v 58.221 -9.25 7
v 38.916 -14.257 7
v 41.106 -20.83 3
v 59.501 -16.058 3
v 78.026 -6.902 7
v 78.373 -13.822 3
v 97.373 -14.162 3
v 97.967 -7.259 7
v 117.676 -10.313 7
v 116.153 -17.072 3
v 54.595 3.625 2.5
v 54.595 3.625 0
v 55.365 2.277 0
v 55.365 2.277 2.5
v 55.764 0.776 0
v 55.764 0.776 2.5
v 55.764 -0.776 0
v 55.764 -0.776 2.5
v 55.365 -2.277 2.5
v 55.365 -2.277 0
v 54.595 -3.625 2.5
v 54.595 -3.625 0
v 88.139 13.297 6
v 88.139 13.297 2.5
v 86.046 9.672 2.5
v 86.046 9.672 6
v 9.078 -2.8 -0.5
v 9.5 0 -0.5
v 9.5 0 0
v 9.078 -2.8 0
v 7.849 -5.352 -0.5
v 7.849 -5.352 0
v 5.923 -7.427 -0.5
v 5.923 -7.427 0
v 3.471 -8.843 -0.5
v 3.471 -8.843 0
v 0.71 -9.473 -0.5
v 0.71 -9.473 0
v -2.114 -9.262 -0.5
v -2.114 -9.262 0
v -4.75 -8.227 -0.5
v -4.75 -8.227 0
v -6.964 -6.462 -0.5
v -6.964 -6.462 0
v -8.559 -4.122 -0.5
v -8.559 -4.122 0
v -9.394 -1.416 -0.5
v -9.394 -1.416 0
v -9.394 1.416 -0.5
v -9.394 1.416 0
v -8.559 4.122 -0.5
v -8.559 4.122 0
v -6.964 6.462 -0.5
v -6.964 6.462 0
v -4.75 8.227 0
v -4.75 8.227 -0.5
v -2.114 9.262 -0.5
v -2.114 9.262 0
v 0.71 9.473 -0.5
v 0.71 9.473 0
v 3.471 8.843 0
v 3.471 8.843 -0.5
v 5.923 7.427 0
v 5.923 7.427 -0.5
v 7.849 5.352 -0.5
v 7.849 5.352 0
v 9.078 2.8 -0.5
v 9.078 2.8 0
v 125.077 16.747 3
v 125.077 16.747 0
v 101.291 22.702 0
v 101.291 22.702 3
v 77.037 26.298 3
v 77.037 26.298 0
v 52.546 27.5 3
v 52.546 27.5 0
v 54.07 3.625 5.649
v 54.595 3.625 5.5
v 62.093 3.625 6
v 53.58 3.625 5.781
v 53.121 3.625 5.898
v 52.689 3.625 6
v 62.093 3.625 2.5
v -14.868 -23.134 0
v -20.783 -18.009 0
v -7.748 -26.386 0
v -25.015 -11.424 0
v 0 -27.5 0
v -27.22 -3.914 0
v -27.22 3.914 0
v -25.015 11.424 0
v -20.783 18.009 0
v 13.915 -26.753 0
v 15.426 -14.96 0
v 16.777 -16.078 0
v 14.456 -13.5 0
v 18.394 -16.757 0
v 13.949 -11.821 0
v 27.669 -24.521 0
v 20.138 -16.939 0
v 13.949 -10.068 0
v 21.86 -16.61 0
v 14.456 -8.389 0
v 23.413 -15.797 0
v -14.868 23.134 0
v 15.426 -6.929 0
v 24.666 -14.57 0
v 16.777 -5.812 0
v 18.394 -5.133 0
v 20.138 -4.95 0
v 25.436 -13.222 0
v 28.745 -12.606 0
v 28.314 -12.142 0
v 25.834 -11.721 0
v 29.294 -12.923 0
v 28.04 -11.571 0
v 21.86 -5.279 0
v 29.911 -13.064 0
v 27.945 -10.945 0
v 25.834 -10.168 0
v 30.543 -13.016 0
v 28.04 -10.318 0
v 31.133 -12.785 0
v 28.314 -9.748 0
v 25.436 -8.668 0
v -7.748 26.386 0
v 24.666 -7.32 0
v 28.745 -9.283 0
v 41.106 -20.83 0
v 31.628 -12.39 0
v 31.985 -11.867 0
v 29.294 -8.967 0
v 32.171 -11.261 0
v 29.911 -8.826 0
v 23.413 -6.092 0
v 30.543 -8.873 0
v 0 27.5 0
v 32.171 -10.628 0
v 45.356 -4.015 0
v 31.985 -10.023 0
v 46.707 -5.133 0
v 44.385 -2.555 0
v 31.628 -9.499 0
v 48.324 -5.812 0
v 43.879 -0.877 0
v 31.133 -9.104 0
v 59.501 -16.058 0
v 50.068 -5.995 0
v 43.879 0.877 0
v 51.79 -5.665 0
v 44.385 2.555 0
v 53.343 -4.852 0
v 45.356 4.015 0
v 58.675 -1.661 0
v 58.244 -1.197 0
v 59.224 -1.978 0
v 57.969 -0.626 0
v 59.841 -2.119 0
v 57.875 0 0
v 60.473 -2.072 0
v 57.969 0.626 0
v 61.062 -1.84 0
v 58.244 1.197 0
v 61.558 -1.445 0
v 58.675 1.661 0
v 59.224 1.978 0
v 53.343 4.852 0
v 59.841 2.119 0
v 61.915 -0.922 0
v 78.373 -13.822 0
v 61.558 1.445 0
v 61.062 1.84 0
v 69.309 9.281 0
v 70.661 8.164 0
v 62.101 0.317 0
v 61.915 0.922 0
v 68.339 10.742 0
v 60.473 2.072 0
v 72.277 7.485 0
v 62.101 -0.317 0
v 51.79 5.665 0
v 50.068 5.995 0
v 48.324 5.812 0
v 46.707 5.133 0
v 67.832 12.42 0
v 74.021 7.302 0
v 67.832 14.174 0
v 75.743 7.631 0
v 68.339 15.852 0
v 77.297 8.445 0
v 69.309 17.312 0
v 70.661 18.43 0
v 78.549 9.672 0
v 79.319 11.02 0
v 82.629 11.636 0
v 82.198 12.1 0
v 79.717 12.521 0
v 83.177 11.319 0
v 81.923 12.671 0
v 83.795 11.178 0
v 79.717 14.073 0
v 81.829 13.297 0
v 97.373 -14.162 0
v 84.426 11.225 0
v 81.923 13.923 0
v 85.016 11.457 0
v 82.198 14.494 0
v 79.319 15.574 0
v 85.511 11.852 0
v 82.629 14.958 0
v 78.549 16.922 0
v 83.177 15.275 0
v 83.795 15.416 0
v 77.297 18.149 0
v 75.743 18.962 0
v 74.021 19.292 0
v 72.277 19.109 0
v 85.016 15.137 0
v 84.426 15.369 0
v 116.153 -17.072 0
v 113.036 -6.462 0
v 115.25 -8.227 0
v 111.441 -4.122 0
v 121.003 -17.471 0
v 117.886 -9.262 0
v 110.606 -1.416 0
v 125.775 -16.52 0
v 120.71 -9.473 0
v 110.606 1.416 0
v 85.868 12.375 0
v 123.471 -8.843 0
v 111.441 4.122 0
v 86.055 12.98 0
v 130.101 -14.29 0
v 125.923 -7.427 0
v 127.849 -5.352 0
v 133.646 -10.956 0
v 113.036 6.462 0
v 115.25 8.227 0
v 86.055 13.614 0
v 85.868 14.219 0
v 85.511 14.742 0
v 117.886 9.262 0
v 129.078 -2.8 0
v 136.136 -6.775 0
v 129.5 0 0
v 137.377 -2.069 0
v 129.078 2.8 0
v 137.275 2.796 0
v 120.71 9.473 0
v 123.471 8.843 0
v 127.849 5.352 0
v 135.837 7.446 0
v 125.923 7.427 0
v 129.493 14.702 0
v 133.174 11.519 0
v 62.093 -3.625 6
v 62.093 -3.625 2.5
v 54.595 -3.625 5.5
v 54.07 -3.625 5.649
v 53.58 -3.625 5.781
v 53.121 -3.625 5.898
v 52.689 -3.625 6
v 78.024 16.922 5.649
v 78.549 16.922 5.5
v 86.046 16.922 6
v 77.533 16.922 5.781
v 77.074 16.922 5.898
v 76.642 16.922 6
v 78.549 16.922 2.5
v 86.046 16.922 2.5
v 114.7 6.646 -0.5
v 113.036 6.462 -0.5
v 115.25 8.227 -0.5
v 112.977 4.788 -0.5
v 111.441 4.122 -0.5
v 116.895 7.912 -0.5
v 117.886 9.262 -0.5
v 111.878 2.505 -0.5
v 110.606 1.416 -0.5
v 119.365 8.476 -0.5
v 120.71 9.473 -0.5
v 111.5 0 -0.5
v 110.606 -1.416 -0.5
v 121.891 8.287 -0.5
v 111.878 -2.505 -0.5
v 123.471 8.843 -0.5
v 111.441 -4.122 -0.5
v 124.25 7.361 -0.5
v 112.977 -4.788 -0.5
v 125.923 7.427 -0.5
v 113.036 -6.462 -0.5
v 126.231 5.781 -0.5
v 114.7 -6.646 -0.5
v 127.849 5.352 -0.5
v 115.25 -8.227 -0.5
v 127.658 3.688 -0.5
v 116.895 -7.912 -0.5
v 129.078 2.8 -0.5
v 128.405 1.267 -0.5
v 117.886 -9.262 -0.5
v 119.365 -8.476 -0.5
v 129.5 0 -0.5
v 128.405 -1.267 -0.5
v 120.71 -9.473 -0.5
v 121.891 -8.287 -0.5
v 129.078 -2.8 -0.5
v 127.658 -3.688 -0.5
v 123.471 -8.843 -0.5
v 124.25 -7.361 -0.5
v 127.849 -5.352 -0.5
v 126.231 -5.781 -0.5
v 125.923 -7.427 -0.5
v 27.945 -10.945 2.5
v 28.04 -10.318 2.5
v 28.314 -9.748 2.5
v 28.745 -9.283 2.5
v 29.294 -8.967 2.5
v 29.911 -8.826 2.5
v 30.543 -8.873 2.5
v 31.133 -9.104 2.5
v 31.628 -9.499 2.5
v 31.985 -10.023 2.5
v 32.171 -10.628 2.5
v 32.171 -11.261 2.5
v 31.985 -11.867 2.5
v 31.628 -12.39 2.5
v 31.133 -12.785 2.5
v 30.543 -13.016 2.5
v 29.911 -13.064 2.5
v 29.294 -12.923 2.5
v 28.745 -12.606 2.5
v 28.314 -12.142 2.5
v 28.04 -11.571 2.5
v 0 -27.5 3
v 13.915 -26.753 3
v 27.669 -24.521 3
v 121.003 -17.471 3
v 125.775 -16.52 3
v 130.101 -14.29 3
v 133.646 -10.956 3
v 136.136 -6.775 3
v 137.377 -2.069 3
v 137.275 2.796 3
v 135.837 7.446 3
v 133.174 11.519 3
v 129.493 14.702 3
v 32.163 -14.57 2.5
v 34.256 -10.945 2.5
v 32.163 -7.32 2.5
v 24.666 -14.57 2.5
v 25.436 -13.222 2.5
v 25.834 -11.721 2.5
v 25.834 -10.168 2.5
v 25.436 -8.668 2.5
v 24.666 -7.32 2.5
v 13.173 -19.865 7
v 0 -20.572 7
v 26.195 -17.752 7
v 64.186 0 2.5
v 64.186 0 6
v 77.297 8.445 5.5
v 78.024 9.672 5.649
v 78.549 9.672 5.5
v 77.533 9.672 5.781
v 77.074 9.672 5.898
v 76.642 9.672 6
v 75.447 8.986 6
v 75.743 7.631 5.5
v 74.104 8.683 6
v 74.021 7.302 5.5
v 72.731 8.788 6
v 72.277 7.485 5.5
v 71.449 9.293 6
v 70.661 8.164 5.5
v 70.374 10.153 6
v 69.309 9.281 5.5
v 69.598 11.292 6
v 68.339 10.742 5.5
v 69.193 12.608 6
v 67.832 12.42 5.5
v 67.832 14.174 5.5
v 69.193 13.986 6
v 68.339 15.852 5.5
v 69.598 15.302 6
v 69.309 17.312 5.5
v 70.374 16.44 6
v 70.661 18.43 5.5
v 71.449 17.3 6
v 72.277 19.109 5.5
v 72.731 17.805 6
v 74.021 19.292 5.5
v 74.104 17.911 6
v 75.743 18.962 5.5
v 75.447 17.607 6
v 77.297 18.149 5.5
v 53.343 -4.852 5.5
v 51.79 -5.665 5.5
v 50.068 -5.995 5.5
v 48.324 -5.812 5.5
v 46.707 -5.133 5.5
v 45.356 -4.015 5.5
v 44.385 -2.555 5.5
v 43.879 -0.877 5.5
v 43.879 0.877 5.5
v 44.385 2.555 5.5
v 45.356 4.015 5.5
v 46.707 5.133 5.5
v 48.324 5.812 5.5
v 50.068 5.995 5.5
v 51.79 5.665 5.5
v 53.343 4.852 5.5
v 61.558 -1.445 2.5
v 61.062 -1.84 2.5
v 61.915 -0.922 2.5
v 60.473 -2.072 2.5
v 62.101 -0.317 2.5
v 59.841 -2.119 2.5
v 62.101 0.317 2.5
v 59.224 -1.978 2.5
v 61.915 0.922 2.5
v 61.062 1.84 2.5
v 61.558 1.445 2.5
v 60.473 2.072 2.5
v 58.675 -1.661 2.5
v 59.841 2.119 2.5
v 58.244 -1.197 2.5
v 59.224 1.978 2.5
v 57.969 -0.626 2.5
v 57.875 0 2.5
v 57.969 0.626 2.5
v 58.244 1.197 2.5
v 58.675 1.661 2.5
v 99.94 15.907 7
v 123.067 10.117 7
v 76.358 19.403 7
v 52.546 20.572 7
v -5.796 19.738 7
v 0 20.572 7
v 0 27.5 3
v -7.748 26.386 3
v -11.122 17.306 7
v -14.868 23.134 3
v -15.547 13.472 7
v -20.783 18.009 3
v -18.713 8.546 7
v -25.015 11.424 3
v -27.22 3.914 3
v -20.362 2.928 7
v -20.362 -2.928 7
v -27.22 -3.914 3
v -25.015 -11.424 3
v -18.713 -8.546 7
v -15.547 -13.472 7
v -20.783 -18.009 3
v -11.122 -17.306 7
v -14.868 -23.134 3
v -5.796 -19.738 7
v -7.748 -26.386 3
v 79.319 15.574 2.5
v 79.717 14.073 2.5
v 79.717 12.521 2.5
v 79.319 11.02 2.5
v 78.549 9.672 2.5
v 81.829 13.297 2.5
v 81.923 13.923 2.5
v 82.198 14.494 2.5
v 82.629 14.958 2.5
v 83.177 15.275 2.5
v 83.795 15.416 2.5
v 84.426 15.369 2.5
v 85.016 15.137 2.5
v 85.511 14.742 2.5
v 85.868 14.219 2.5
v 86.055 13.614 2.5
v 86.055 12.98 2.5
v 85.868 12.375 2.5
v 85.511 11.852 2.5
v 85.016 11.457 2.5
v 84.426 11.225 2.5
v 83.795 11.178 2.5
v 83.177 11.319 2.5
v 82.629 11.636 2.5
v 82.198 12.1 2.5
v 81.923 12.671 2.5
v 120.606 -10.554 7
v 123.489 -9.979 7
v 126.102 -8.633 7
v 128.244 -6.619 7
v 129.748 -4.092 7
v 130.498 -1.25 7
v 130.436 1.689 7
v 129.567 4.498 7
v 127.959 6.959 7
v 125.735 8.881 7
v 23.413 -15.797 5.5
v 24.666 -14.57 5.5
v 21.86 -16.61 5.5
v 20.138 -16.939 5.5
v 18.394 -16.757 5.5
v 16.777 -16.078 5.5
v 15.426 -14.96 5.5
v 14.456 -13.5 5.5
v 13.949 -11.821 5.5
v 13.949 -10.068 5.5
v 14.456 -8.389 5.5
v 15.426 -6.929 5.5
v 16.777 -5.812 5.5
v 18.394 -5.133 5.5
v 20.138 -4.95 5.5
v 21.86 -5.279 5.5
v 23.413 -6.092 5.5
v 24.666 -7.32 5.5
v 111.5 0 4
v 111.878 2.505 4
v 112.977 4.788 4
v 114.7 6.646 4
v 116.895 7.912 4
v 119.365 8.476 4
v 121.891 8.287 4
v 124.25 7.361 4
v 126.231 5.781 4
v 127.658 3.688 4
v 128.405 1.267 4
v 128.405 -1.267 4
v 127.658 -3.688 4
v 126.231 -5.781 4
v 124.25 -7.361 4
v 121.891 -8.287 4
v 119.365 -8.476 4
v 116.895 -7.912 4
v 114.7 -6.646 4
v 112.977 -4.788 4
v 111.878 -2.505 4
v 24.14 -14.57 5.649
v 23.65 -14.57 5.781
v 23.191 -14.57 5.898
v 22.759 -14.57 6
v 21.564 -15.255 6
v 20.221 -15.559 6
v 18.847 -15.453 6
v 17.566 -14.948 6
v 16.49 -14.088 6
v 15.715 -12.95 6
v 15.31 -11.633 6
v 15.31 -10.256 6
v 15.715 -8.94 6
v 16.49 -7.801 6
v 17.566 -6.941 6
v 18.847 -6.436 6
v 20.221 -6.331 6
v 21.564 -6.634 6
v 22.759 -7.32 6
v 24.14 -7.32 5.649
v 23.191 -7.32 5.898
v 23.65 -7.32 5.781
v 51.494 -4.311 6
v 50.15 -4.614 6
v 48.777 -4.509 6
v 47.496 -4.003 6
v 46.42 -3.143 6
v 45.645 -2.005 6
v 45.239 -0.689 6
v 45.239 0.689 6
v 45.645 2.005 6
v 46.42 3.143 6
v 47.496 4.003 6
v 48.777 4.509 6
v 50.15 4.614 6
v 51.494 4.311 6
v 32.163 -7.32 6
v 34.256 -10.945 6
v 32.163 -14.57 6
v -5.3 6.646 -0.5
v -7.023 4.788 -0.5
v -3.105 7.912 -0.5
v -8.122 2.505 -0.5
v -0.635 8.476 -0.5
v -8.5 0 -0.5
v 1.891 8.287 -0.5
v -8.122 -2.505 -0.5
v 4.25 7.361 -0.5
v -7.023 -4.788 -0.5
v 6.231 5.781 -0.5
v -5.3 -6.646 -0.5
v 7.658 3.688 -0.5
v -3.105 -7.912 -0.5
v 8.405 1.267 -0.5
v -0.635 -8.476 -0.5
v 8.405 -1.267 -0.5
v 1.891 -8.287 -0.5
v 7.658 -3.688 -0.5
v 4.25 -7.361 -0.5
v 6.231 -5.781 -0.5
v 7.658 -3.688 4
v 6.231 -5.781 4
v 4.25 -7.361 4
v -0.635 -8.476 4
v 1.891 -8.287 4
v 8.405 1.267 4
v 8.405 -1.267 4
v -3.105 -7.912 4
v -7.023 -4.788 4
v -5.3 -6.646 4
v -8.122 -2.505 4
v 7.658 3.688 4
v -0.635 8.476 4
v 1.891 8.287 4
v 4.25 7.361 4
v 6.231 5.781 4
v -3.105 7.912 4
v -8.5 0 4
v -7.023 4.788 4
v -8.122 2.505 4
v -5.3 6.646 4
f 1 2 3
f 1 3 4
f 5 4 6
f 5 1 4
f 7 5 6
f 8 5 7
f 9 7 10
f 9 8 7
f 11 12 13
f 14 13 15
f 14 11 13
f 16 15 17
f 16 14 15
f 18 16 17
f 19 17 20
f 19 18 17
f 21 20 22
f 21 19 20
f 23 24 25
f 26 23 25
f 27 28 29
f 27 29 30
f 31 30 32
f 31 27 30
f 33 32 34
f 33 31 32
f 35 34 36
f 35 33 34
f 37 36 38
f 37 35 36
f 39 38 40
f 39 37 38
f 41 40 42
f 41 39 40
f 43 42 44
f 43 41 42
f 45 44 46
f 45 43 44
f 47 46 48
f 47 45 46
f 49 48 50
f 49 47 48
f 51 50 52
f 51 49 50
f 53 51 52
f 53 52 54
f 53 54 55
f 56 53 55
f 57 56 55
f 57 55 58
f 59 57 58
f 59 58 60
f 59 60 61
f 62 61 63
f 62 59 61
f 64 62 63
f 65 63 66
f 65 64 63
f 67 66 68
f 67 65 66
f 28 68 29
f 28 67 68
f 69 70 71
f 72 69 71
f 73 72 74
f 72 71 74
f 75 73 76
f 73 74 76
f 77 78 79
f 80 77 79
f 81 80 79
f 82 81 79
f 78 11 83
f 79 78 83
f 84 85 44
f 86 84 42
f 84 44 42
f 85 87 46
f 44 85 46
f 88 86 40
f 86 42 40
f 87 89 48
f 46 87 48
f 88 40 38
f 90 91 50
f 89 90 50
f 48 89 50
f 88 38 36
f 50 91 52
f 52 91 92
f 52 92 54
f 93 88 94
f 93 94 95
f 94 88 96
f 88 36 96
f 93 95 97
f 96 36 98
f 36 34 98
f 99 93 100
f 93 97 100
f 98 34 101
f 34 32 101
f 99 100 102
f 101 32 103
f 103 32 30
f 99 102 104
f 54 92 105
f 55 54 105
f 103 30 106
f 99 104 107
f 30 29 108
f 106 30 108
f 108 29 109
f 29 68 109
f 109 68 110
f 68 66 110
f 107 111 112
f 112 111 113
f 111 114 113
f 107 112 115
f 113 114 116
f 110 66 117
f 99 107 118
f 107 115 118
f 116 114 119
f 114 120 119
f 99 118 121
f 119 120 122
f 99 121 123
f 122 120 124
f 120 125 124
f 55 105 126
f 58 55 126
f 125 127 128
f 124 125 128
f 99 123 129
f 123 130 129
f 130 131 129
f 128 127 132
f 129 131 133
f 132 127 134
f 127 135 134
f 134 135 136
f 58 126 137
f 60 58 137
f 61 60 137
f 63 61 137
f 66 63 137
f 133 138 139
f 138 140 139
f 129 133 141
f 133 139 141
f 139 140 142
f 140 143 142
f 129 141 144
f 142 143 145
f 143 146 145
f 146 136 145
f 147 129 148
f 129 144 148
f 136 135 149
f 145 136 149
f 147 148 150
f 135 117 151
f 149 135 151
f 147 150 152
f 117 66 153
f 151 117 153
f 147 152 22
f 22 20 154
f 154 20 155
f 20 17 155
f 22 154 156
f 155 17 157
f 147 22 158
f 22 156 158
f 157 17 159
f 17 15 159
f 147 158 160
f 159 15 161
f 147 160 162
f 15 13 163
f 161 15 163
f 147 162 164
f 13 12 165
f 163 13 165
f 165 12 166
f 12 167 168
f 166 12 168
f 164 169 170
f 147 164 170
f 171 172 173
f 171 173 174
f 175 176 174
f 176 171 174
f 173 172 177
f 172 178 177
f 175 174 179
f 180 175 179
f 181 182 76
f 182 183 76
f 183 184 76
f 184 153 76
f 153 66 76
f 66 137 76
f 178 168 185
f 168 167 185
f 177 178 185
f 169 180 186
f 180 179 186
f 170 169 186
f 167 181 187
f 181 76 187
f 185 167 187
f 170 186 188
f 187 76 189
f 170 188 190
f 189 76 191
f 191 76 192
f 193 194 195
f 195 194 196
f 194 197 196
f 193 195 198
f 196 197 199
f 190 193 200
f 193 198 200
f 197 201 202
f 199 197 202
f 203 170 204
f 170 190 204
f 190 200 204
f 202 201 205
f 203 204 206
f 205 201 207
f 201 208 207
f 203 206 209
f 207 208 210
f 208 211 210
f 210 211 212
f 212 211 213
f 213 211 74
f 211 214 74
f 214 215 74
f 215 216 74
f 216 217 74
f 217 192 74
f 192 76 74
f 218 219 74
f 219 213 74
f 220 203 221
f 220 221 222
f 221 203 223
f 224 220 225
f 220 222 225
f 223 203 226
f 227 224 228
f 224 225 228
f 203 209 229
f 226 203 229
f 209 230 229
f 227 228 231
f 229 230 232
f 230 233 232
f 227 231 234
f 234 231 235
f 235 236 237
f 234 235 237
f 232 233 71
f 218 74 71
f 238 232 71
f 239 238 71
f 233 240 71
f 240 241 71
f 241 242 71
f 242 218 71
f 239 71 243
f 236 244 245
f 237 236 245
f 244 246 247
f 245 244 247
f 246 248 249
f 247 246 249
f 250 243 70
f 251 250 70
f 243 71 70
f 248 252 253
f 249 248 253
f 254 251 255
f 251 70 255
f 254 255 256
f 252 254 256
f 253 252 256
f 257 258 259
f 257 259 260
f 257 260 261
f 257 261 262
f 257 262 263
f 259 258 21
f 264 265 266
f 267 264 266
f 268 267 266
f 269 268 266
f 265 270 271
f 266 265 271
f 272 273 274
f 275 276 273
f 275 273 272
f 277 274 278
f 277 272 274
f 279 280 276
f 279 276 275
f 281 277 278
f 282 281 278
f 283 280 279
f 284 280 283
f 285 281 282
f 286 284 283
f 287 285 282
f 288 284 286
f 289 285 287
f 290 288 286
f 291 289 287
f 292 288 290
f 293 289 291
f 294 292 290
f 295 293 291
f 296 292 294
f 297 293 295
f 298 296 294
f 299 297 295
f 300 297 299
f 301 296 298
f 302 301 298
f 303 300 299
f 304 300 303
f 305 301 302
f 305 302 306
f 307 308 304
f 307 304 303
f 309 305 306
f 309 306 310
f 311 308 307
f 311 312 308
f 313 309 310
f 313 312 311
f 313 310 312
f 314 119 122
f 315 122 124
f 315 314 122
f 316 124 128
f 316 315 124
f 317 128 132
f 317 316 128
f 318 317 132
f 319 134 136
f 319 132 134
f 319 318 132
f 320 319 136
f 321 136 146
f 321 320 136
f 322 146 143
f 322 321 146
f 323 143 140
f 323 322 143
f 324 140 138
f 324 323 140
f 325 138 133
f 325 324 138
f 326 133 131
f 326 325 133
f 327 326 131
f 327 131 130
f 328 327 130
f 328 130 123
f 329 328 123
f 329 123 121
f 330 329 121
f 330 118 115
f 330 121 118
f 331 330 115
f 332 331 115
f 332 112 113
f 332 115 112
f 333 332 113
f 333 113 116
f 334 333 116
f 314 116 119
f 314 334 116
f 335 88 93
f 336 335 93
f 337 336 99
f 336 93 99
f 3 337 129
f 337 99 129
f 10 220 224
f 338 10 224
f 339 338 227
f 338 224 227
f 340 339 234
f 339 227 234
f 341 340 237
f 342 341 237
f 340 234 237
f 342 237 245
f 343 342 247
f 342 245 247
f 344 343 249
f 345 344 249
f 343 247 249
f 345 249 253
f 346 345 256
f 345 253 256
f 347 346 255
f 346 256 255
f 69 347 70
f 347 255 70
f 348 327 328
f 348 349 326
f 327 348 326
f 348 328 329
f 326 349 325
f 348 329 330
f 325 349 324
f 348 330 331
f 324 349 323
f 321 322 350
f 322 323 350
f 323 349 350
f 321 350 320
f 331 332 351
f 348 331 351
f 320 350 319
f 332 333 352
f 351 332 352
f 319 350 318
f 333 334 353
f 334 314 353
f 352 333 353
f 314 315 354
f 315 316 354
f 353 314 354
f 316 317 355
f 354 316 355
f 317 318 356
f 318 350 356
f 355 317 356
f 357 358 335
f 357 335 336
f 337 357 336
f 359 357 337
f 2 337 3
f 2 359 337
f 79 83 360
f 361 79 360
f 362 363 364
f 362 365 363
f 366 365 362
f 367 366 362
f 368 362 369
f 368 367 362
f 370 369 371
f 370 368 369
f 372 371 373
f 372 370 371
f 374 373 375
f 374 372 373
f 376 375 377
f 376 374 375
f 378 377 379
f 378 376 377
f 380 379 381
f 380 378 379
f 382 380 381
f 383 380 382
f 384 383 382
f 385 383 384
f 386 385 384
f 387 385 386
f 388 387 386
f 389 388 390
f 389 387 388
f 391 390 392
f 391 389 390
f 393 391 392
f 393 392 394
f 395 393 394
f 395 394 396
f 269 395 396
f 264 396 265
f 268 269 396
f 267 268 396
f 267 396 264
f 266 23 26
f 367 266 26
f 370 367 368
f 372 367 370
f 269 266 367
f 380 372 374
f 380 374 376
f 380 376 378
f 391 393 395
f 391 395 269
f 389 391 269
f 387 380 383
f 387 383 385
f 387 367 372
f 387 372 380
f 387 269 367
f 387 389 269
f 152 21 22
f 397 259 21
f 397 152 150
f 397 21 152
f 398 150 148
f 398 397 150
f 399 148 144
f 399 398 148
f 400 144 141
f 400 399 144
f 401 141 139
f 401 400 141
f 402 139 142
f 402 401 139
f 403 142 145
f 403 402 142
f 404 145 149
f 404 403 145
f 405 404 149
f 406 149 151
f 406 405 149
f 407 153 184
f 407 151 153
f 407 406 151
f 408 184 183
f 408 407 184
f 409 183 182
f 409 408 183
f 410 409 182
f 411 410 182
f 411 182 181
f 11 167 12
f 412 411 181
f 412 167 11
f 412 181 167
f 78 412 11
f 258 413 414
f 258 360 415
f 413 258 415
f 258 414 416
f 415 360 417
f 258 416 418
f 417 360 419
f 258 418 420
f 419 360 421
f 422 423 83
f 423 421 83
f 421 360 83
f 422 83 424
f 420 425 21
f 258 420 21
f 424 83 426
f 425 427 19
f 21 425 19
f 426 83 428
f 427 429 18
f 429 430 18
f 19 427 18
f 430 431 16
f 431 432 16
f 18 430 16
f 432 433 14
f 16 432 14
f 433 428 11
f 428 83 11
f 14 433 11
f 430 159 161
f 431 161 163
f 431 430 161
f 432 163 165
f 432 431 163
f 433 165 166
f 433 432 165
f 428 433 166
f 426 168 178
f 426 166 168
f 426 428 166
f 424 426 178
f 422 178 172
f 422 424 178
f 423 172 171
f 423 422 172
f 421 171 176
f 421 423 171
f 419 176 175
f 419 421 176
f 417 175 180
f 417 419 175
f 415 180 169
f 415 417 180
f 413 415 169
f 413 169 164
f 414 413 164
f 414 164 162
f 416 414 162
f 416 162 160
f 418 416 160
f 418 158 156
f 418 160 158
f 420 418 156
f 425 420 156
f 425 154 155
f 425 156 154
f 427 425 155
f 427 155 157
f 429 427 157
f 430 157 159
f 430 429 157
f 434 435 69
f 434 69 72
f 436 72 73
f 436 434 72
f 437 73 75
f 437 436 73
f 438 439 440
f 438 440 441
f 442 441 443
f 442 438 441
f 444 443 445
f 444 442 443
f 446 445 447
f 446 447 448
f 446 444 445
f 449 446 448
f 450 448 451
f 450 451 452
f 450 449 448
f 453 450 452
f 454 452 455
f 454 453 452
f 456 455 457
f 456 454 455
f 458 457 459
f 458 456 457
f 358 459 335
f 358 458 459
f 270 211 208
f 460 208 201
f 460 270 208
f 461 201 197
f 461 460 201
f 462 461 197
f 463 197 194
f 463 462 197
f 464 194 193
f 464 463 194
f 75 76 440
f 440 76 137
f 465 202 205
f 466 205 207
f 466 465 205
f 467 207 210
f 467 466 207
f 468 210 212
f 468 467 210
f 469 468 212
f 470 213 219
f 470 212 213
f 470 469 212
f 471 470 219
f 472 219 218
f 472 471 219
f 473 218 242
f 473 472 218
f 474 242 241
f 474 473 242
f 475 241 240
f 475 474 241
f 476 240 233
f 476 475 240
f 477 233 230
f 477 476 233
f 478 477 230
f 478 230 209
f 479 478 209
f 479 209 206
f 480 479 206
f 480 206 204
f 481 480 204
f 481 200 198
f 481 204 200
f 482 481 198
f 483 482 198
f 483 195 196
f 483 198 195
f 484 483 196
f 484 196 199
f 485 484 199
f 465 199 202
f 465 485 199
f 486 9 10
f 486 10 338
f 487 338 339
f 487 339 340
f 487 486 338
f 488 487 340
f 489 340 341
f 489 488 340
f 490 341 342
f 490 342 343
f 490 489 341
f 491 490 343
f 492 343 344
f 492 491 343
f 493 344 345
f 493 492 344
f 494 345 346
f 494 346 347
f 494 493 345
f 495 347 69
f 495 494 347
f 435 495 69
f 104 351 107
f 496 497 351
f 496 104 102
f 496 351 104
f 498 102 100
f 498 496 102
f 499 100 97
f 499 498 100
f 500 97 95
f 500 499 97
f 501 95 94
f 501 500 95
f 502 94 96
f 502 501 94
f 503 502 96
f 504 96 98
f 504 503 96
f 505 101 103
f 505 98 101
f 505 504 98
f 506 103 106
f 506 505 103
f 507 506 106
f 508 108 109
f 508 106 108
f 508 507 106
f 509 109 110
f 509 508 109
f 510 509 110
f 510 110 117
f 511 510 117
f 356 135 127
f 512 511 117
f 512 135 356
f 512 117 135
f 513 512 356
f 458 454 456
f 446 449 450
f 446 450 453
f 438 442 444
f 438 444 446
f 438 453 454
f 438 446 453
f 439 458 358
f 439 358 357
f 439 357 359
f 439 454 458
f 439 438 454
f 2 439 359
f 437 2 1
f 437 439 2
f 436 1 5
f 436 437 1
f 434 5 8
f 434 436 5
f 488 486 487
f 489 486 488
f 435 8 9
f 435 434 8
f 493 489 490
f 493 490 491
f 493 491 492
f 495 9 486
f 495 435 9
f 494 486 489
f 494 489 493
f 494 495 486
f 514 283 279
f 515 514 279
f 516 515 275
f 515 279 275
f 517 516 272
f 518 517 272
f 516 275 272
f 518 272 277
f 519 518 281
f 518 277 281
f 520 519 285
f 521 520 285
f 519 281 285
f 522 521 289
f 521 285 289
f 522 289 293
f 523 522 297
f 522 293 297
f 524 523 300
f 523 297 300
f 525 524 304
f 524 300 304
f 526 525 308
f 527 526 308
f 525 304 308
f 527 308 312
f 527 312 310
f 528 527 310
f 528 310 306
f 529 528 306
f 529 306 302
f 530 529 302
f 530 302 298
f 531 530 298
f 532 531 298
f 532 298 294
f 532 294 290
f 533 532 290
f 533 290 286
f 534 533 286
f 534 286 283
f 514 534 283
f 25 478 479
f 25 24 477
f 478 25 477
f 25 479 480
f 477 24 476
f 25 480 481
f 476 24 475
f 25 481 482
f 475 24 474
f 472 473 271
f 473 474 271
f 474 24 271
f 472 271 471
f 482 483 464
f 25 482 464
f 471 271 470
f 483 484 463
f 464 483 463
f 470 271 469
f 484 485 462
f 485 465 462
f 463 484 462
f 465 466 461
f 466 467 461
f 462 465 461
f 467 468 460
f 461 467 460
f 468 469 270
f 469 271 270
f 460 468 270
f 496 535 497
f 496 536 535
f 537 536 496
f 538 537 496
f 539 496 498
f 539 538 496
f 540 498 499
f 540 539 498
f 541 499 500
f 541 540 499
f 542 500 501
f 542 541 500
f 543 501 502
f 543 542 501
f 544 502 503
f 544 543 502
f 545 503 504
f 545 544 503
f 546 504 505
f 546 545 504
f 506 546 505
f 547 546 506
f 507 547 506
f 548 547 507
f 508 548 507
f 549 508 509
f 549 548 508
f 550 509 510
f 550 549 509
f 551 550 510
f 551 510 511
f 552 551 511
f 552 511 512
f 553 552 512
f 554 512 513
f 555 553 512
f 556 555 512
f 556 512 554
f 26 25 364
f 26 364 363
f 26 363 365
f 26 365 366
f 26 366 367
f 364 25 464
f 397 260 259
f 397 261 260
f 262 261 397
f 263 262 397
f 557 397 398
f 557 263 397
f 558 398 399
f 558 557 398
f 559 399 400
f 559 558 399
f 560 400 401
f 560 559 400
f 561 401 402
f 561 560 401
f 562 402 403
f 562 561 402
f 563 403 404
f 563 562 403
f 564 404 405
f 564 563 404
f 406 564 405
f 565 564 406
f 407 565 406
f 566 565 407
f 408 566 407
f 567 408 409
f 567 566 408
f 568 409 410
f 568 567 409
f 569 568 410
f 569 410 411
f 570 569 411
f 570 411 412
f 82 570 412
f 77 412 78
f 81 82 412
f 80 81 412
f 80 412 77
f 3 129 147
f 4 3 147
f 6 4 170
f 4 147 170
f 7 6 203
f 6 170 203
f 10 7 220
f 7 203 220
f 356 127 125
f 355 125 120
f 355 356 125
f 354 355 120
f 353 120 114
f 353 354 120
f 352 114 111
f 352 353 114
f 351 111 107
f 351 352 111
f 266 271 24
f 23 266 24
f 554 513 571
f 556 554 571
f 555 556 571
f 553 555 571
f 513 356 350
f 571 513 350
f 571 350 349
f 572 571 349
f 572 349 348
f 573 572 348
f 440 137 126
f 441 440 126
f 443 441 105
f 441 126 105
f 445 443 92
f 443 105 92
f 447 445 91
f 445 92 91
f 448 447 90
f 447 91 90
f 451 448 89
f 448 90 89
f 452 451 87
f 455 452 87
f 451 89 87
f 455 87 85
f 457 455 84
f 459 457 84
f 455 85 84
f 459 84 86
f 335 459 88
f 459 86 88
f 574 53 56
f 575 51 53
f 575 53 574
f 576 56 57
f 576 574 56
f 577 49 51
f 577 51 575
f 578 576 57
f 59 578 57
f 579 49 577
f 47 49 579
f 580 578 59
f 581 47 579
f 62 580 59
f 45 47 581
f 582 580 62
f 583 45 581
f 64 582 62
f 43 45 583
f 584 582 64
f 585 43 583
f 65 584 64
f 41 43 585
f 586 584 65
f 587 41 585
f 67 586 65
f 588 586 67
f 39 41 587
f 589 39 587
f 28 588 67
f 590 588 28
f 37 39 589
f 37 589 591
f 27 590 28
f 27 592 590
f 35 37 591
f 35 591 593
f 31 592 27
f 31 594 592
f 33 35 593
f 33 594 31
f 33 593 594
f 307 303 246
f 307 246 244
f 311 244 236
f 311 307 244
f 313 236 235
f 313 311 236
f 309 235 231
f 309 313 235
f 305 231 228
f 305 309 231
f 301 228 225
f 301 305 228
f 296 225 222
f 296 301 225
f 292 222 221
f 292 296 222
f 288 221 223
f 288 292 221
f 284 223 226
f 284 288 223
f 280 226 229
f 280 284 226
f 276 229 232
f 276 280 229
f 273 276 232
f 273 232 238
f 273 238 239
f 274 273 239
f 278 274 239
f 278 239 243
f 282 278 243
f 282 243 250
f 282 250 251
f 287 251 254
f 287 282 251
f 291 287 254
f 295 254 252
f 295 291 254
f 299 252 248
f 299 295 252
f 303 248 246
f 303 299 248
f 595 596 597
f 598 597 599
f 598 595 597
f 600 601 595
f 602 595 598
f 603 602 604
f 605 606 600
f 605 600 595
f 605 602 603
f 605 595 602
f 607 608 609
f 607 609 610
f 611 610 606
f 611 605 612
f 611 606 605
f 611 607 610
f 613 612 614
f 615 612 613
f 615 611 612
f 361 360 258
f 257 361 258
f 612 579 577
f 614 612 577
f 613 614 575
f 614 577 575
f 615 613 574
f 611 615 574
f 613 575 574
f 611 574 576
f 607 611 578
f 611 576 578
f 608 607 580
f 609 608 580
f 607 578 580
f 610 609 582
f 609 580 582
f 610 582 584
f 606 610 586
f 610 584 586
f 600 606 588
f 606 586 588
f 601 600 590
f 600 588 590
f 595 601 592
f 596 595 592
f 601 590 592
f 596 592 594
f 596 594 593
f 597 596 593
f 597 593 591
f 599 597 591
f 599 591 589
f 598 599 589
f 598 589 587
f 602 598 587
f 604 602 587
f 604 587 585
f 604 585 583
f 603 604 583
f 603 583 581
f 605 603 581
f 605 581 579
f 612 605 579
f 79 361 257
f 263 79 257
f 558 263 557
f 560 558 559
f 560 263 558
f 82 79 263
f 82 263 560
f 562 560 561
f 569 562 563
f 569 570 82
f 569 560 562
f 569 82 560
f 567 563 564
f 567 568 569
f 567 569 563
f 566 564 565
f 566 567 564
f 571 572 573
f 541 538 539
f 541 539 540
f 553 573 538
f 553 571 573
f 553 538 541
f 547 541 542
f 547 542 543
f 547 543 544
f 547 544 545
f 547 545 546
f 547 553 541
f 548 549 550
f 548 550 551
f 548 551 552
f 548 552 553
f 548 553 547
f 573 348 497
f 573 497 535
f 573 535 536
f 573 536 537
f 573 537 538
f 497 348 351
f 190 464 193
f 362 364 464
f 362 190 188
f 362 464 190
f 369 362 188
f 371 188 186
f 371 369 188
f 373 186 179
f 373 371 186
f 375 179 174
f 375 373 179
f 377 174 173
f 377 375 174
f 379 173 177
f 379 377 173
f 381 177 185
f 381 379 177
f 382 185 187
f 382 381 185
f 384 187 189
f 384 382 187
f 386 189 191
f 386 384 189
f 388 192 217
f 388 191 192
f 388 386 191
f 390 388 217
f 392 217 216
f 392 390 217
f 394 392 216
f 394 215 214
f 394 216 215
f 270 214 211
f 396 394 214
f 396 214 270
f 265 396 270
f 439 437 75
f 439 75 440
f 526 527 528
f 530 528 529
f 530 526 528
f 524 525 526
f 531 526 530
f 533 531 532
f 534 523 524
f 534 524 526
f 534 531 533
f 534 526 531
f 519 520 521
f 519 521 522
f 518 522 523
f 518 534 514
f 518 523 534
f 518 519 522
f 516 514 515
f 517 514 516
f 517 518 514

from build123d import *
from OCP.BRepFilletAPI import BRepFilletAPI_MakeChamfer

# Parameters (mm, degrees)
BOSS_EXTRUDE1_DEPTH = 7
CHAMFER1_SIZE       = 4
CHAMFER1_SIZE2      = 6.92820323
SKETCH3_R           = 8.5
CUT_EXTRUDE2_DEPTH  = 4
CUT_EXTRUDE3_DEPTH  = 3.5
SKETCH5_3_R         = 2.125
CUT_EXTRUDE4_DEPTH  = 141.295224438
CHAMFER2_SIZE       = 0.5
CHAMFER2_SIZE2      = 1.37373871
BOSS_EXTRUDE2_START = 0.5
SKETCH7_R           = 9.5
SKETCH7_R_2         = 8.5
BOSS_EXTRUDE2_DEPTH = 0.5


with BuildPart() as part:
    # Sketch1 → Boss-Extrude1 (new body)
    with BuildSketch(Plane.XY):
        with BuildLine():
            Line((52.546312184, 27.5), (0, 27.5))
            ThreePointArc((0, 27.5), (-27.5, 0), (0, -27.5))
            ThreePointArc((0, -27.5), (20.821970152, -25.821648832), (41.106300643, -20.829931677))
            ThreePointArc((41.106300643, -20.829931677), (78.372680186, -13.821988034), (116.152736046, -17.071864575))
            ThreePointArc((116.152736046, -17.071864575), (136.920766347, -4.465161388), (125.077159298, 16.747311828))
            ThreePointArc((125.077159298, 16.747311828), (89.208090939, 24.797217895), (52.546312184, 27.5))
        make_face()
    extrude(amount=BOSS_EXTRUDE1_DEPTH)

    # Chamfer1: one chamfer whose edges measure the first distance from different faces: ONE call of the kernel's chamfer builder (chamfer() names one face for all edges)
    chamfer1_edges_1 = [part.edges().sort_by_distance(p)[0] for p in [
        (20.821970152, -25.821648832, 7),
    ]]
    chamfer1_side_1 = [part.faces().sort_by_distance(p)[0] for p in [
        (20.821970152, -25.821648832, 3.5),
    ]]
    chamfer1_edges_2 = [part.edges().sort_by_distance(p)[0] for p in [
        (-27.5, 0, 7),
    ]]
    chamfer1_side_2 = [part.faces().sort_by_distance(p)[0] for p in [
        (-27.5, 0, 3.5),
    ]]
    chamfer1_edges_3 = [part.edges().sort_by_distance(p)[0] for p in [
        (26.273156092, 27.5, 7),
    ]]
    chamfer1_side_3 = [part.faces().sort_by_distance(p)[0] for p in [
        (26.273156092, 27.5, 3.5),
    ]]
    chamfer1_edges_4 = [part.edges().sort_by_distance(p)[0] for p in [
        (89.208090939, 24.797217895, 7),
    ]]
    chamfer1_side_4 = [part.faces().sort_by_distance(p)[0] for p in [
        (89.208090939, 24.797217895, 3.5),
    ]]
    chamfer1_edges_5 = [part.edges().sort_by_distance(p)[0] for p in [
        (136.920766347, -4.465161388, 7),
    ]]
    chamfer1_side_5 = [part.faces().sort_by_distance(p)[0] for p in [
        (136.920766347, -4.465161388, 3.5),
    ]]
    chamfer1_edges_6 = [part.edges().sort_by_distance(p)[0] for p in [
        (78.372680186, -13.821988034, 7),
    ]]
    chamfer1_side_6 = [part.faces().sort_by_distance(p)[0] for p in [
        (78.372680186, -13.821988034, 3.5),
    ]]
    chamfer1 = BRepFilletAPI_MakeChamfer(part.part.solid().wrapped)
    for e in chamfer1_edges_1:
        chamfer1.Add(CHAMFER1_SIZE, CHAMFER1_SIZE2, e.wrapped, chamfer1_side_1[0].wrapped)  # the first distance lies on this face
    for e in chamfer1_edges_2:
        chamfer1.Add(CHAMFER1_SIZE, CHAMFER1_SIZE2, e.wrapped, chamfer1_side_2[0].wrapped)  # the first distance lies on this face
    for e in chamfer1_edges_3:
        chamfer1.Add(CHAMFER1_SIZE, CHAMFER1_SIZE2, e.wrapped, chamfer1_side_3[0].wrapped)  # the first distance lies on this face
    for e in chamfer1_edges_4:
        chamfer1.Add(CHAMFER1_SIZE, CHAMFER1_SIZE2, e.wrapped, chamfer1_side_4[0].wrapped)  # the first distance lies on this face
    for e in chamfer1_edges_5:
        chamfer1.Add(CHAMFER1_SIZE, CHAMFER1_SIZE2, e.wrapped, chamfer1_side_5[0].wrapped)  # the first distance lies on this face
    for e in chamfer1_edges_6:
        chamfer1.Add(CHAMFER1_SIZE, CHAMFER1_SIZE2, e.wrapped, chamfer1_side_6[0].wrapped)  # the first distance lies on this face
    add(Compound.cast(chamfer1.Shape()), mode=Mode.REPLACE)

    # Sketch3 → Cut-Extrude2 (cut)
    with BuildSketch(Plane(origin=(0, 0, 0), x_dir=(-1, 0, 0), z_dir=(0, 0, -1))):
        Circle(SKETCH3_R)
        with Locations((-120, 0)):
            Circle(SKETCH3_R)
    extrude(amount=-CUT_EXTRUDE2_DEPTH, mode=Mode.SUBTRACT)

    # Sketch5 → Cut-Extrude3 (cut)
    with BuildSketch(Plane(origin=(0, 0, 2.5), x_dir=(-1, 0, 0), z_dir=(0, 0, -1))):
        with BuildLine():
            Line((-86.046403676, 16.921929528), (-88.139298402, 13.296929528))
            Line((-88.139298402, 13.296929528), (-86.046403676, 9.671929528))
            Line((-86.046403676, 9.671929528), (-78.548867374, 9.671929528))
            ThreePointArc((-78.548867374, 9.671929528), (-67.767719499, 13.296929528), (-78.548867374, 16.921929528))
            Line((-78.548867374, 16.921929528), (-86.046403676, 16.921929528))
        make_face()
        with BuildLine():
            Line((-62.092894726, -3.625), (-54.595358423, -3.625))
            ThreePointArc((-54.595358423, -3.625), (-43.814210548, 0), (-54.595358423, 3.625))
            Line((-54.595358423, 3.625), (-62.092894726, 3.625))
            Line((-62.092894726, 3.625), (-64.185789452, 0))
            Line((-64.185789452, 0), (-62.092894726, -3.625))
        make_face()
        with BuildLine():
            Line((-32.163058591, -14.569644586), (-24.665522288, -14.569644586))
            ThreePointArc((-24.665522288, -14.569644586), (-13.884374414, -10.944644586), (-24.665522288, -7.319644586))
            Line((-24.665522288, -7.319644586), (-32.163058591, -7.319644586))
            Line((-32.163058591, -7.319644586), (-34.255953317, -10.944644586))
            Line((-34.255953317, -10.944644586), (-32.163058591, -14.569644586))
        make_face()
    extrude(amount=-CUT_EXTRUDE3_DEPTH, mode=Mode.SUBTRACT)

    # Sketch5<3> → Cut-Extrude4 (cut, through all)
    with BuildSketch(Plane(origin=(0, 0, 2.5), x_dir=(-1, 0, 0), z_dir=(0, 0, -1))):
        with BuildLine():
            ThreePointArc((-78.548867374, 9.671929528), (-67.767719499, 13.296929528), (-78.548867374, 16.921929528))
            ThreePointArc((-78.548867374, 16.921929528), (-79.767719499, 13.296929528), (-78.548867374, 9.671929528))
        make_face()
        with BuildLine():
            ThreePointArc((-54.595358423, 3.625), (-55.814210548, 0), (-54.595358423, -3.625))
            ThreePointArc((-54.595358423, -3.625), (-43.814210548, 0), (-54.595358423, 3.625))
        make_face()
        with BuildLine():
            ThreePointArc((-24.665522288, -7.319644586), (-25.884374414, -10.944644586), (-24.665522288, -14.569644586))
            ThreePointArc((-24.665522288, -14.569644586), (-13.884374414, -10.944644586), (-24.665522288, -7.319644586))
        make_face()
        with Locations((-83.953508951, 13.296929528)):
            Circle(SKETCH5_3_R)
        with Locations((-60, 0)):
            Circle(SKETCH5_3_R)
        with Locations((-30.070163865, -10.944644586)):
            Circle(SKETCH5_3_R)
    extrude(amount=CUT_EXTRUDE4_DEPTH, mode=Mode.SUBTRACT)

    # Chamfer2: one chamfer whose edges measure the first distance from different faces: ONE call of the kernel's chamfer builder (chamfer() names one face for all edges)
    chamfer2_edges_1 = [part.edges().sort_by_distance(p)[0] for p in [
        (67.767719499, 13.296929528, 6),
    ]]
    chamfer2_side_1 = [part.faces().sort_by_distance(p)[0] for p in [
        (68.986571624, 9.671929528, 3),
    ]]
    chamfer2_edges_2 = [part.edges().sort_by_distance(p)[0] for p in [
        (13.884374414, -10.944644586, 6),
    ]]
    chamfer2_side_2 = [part.faces().sort_by_distance(p)[0] for p in [
        (15.103226539, -14.569644586, 3),
    ]]
    chamfer2_edges_3 = [part.edges().sort_by_distance(p)[0] for p in [
        (43.814210548, 0, 6),
    ]]
    chamfer2_side_3 = [part.faces().sort_by_distance(p)[0] for p in [
        (45.033062674, -3.625, 3),
    ]]
    chamfer2 = BRepFilletAPI_MakeChamfer(part.part.solid().wrapped)
    for e in chamfer2_edges_1:
        chamfer2.Add(CHAMFER2_SIZE, CHAMFER2_SIZE2, e.wrapped, chamfer2_side_1[0].wrapped)  # the first distance lies on this face
    for e in chamfer2_edges_2:
        chamfer2.Add(CHAMFER2_SIZE, CHAMFER2_SIZE2, e.wrapped, chamfer2_side_2[0].wrapped)  # the first distance lies on this face
    for e in chamfer2_edges_3:
        chamfer2.Add(CHAMFER2_SIZE, CHAMFER2_SIZE2, e.wrapped, chamfer2_side_3[0].wrapped)  # the first distance lies on this face
    add(Compound.cast(chamfer2.Shape()), mode=Mode.REPLACE)

    # Sketch7 → Boss-Extrude2 (add)
    # profile 1 of 2: a face of its own
    with BuildSketch(Plane(origin=(0, 0, 0), x_dir=(-1, 0, 0), z_dir=(0, 0, -1)).offset(BOSS_EXTRUDE2_START)):
        Circle(SKETCH7_R)
        Circle(SKETCH7_R_2, mode=Mode.SUBTRACT)
    # profile 2 of 2: a face of its own
    with BuildSketch(Plane(origin=(0, 0, 0), x_dir=(-1, 0, 0), z_dir=(0, 0, -1)).offset(BOSS_EXTRUDE2_START)):
        with Locations((-120, 0)):
            Circle(SKETCH7_R)
        with Locations((-120, 0)):
            Circle(SKETCH7_R_2, mode=Mode.SUBTRACT)
    extrude(amount=-BOSS_EXTRUDE2_DEPTH)


solid = part.part
